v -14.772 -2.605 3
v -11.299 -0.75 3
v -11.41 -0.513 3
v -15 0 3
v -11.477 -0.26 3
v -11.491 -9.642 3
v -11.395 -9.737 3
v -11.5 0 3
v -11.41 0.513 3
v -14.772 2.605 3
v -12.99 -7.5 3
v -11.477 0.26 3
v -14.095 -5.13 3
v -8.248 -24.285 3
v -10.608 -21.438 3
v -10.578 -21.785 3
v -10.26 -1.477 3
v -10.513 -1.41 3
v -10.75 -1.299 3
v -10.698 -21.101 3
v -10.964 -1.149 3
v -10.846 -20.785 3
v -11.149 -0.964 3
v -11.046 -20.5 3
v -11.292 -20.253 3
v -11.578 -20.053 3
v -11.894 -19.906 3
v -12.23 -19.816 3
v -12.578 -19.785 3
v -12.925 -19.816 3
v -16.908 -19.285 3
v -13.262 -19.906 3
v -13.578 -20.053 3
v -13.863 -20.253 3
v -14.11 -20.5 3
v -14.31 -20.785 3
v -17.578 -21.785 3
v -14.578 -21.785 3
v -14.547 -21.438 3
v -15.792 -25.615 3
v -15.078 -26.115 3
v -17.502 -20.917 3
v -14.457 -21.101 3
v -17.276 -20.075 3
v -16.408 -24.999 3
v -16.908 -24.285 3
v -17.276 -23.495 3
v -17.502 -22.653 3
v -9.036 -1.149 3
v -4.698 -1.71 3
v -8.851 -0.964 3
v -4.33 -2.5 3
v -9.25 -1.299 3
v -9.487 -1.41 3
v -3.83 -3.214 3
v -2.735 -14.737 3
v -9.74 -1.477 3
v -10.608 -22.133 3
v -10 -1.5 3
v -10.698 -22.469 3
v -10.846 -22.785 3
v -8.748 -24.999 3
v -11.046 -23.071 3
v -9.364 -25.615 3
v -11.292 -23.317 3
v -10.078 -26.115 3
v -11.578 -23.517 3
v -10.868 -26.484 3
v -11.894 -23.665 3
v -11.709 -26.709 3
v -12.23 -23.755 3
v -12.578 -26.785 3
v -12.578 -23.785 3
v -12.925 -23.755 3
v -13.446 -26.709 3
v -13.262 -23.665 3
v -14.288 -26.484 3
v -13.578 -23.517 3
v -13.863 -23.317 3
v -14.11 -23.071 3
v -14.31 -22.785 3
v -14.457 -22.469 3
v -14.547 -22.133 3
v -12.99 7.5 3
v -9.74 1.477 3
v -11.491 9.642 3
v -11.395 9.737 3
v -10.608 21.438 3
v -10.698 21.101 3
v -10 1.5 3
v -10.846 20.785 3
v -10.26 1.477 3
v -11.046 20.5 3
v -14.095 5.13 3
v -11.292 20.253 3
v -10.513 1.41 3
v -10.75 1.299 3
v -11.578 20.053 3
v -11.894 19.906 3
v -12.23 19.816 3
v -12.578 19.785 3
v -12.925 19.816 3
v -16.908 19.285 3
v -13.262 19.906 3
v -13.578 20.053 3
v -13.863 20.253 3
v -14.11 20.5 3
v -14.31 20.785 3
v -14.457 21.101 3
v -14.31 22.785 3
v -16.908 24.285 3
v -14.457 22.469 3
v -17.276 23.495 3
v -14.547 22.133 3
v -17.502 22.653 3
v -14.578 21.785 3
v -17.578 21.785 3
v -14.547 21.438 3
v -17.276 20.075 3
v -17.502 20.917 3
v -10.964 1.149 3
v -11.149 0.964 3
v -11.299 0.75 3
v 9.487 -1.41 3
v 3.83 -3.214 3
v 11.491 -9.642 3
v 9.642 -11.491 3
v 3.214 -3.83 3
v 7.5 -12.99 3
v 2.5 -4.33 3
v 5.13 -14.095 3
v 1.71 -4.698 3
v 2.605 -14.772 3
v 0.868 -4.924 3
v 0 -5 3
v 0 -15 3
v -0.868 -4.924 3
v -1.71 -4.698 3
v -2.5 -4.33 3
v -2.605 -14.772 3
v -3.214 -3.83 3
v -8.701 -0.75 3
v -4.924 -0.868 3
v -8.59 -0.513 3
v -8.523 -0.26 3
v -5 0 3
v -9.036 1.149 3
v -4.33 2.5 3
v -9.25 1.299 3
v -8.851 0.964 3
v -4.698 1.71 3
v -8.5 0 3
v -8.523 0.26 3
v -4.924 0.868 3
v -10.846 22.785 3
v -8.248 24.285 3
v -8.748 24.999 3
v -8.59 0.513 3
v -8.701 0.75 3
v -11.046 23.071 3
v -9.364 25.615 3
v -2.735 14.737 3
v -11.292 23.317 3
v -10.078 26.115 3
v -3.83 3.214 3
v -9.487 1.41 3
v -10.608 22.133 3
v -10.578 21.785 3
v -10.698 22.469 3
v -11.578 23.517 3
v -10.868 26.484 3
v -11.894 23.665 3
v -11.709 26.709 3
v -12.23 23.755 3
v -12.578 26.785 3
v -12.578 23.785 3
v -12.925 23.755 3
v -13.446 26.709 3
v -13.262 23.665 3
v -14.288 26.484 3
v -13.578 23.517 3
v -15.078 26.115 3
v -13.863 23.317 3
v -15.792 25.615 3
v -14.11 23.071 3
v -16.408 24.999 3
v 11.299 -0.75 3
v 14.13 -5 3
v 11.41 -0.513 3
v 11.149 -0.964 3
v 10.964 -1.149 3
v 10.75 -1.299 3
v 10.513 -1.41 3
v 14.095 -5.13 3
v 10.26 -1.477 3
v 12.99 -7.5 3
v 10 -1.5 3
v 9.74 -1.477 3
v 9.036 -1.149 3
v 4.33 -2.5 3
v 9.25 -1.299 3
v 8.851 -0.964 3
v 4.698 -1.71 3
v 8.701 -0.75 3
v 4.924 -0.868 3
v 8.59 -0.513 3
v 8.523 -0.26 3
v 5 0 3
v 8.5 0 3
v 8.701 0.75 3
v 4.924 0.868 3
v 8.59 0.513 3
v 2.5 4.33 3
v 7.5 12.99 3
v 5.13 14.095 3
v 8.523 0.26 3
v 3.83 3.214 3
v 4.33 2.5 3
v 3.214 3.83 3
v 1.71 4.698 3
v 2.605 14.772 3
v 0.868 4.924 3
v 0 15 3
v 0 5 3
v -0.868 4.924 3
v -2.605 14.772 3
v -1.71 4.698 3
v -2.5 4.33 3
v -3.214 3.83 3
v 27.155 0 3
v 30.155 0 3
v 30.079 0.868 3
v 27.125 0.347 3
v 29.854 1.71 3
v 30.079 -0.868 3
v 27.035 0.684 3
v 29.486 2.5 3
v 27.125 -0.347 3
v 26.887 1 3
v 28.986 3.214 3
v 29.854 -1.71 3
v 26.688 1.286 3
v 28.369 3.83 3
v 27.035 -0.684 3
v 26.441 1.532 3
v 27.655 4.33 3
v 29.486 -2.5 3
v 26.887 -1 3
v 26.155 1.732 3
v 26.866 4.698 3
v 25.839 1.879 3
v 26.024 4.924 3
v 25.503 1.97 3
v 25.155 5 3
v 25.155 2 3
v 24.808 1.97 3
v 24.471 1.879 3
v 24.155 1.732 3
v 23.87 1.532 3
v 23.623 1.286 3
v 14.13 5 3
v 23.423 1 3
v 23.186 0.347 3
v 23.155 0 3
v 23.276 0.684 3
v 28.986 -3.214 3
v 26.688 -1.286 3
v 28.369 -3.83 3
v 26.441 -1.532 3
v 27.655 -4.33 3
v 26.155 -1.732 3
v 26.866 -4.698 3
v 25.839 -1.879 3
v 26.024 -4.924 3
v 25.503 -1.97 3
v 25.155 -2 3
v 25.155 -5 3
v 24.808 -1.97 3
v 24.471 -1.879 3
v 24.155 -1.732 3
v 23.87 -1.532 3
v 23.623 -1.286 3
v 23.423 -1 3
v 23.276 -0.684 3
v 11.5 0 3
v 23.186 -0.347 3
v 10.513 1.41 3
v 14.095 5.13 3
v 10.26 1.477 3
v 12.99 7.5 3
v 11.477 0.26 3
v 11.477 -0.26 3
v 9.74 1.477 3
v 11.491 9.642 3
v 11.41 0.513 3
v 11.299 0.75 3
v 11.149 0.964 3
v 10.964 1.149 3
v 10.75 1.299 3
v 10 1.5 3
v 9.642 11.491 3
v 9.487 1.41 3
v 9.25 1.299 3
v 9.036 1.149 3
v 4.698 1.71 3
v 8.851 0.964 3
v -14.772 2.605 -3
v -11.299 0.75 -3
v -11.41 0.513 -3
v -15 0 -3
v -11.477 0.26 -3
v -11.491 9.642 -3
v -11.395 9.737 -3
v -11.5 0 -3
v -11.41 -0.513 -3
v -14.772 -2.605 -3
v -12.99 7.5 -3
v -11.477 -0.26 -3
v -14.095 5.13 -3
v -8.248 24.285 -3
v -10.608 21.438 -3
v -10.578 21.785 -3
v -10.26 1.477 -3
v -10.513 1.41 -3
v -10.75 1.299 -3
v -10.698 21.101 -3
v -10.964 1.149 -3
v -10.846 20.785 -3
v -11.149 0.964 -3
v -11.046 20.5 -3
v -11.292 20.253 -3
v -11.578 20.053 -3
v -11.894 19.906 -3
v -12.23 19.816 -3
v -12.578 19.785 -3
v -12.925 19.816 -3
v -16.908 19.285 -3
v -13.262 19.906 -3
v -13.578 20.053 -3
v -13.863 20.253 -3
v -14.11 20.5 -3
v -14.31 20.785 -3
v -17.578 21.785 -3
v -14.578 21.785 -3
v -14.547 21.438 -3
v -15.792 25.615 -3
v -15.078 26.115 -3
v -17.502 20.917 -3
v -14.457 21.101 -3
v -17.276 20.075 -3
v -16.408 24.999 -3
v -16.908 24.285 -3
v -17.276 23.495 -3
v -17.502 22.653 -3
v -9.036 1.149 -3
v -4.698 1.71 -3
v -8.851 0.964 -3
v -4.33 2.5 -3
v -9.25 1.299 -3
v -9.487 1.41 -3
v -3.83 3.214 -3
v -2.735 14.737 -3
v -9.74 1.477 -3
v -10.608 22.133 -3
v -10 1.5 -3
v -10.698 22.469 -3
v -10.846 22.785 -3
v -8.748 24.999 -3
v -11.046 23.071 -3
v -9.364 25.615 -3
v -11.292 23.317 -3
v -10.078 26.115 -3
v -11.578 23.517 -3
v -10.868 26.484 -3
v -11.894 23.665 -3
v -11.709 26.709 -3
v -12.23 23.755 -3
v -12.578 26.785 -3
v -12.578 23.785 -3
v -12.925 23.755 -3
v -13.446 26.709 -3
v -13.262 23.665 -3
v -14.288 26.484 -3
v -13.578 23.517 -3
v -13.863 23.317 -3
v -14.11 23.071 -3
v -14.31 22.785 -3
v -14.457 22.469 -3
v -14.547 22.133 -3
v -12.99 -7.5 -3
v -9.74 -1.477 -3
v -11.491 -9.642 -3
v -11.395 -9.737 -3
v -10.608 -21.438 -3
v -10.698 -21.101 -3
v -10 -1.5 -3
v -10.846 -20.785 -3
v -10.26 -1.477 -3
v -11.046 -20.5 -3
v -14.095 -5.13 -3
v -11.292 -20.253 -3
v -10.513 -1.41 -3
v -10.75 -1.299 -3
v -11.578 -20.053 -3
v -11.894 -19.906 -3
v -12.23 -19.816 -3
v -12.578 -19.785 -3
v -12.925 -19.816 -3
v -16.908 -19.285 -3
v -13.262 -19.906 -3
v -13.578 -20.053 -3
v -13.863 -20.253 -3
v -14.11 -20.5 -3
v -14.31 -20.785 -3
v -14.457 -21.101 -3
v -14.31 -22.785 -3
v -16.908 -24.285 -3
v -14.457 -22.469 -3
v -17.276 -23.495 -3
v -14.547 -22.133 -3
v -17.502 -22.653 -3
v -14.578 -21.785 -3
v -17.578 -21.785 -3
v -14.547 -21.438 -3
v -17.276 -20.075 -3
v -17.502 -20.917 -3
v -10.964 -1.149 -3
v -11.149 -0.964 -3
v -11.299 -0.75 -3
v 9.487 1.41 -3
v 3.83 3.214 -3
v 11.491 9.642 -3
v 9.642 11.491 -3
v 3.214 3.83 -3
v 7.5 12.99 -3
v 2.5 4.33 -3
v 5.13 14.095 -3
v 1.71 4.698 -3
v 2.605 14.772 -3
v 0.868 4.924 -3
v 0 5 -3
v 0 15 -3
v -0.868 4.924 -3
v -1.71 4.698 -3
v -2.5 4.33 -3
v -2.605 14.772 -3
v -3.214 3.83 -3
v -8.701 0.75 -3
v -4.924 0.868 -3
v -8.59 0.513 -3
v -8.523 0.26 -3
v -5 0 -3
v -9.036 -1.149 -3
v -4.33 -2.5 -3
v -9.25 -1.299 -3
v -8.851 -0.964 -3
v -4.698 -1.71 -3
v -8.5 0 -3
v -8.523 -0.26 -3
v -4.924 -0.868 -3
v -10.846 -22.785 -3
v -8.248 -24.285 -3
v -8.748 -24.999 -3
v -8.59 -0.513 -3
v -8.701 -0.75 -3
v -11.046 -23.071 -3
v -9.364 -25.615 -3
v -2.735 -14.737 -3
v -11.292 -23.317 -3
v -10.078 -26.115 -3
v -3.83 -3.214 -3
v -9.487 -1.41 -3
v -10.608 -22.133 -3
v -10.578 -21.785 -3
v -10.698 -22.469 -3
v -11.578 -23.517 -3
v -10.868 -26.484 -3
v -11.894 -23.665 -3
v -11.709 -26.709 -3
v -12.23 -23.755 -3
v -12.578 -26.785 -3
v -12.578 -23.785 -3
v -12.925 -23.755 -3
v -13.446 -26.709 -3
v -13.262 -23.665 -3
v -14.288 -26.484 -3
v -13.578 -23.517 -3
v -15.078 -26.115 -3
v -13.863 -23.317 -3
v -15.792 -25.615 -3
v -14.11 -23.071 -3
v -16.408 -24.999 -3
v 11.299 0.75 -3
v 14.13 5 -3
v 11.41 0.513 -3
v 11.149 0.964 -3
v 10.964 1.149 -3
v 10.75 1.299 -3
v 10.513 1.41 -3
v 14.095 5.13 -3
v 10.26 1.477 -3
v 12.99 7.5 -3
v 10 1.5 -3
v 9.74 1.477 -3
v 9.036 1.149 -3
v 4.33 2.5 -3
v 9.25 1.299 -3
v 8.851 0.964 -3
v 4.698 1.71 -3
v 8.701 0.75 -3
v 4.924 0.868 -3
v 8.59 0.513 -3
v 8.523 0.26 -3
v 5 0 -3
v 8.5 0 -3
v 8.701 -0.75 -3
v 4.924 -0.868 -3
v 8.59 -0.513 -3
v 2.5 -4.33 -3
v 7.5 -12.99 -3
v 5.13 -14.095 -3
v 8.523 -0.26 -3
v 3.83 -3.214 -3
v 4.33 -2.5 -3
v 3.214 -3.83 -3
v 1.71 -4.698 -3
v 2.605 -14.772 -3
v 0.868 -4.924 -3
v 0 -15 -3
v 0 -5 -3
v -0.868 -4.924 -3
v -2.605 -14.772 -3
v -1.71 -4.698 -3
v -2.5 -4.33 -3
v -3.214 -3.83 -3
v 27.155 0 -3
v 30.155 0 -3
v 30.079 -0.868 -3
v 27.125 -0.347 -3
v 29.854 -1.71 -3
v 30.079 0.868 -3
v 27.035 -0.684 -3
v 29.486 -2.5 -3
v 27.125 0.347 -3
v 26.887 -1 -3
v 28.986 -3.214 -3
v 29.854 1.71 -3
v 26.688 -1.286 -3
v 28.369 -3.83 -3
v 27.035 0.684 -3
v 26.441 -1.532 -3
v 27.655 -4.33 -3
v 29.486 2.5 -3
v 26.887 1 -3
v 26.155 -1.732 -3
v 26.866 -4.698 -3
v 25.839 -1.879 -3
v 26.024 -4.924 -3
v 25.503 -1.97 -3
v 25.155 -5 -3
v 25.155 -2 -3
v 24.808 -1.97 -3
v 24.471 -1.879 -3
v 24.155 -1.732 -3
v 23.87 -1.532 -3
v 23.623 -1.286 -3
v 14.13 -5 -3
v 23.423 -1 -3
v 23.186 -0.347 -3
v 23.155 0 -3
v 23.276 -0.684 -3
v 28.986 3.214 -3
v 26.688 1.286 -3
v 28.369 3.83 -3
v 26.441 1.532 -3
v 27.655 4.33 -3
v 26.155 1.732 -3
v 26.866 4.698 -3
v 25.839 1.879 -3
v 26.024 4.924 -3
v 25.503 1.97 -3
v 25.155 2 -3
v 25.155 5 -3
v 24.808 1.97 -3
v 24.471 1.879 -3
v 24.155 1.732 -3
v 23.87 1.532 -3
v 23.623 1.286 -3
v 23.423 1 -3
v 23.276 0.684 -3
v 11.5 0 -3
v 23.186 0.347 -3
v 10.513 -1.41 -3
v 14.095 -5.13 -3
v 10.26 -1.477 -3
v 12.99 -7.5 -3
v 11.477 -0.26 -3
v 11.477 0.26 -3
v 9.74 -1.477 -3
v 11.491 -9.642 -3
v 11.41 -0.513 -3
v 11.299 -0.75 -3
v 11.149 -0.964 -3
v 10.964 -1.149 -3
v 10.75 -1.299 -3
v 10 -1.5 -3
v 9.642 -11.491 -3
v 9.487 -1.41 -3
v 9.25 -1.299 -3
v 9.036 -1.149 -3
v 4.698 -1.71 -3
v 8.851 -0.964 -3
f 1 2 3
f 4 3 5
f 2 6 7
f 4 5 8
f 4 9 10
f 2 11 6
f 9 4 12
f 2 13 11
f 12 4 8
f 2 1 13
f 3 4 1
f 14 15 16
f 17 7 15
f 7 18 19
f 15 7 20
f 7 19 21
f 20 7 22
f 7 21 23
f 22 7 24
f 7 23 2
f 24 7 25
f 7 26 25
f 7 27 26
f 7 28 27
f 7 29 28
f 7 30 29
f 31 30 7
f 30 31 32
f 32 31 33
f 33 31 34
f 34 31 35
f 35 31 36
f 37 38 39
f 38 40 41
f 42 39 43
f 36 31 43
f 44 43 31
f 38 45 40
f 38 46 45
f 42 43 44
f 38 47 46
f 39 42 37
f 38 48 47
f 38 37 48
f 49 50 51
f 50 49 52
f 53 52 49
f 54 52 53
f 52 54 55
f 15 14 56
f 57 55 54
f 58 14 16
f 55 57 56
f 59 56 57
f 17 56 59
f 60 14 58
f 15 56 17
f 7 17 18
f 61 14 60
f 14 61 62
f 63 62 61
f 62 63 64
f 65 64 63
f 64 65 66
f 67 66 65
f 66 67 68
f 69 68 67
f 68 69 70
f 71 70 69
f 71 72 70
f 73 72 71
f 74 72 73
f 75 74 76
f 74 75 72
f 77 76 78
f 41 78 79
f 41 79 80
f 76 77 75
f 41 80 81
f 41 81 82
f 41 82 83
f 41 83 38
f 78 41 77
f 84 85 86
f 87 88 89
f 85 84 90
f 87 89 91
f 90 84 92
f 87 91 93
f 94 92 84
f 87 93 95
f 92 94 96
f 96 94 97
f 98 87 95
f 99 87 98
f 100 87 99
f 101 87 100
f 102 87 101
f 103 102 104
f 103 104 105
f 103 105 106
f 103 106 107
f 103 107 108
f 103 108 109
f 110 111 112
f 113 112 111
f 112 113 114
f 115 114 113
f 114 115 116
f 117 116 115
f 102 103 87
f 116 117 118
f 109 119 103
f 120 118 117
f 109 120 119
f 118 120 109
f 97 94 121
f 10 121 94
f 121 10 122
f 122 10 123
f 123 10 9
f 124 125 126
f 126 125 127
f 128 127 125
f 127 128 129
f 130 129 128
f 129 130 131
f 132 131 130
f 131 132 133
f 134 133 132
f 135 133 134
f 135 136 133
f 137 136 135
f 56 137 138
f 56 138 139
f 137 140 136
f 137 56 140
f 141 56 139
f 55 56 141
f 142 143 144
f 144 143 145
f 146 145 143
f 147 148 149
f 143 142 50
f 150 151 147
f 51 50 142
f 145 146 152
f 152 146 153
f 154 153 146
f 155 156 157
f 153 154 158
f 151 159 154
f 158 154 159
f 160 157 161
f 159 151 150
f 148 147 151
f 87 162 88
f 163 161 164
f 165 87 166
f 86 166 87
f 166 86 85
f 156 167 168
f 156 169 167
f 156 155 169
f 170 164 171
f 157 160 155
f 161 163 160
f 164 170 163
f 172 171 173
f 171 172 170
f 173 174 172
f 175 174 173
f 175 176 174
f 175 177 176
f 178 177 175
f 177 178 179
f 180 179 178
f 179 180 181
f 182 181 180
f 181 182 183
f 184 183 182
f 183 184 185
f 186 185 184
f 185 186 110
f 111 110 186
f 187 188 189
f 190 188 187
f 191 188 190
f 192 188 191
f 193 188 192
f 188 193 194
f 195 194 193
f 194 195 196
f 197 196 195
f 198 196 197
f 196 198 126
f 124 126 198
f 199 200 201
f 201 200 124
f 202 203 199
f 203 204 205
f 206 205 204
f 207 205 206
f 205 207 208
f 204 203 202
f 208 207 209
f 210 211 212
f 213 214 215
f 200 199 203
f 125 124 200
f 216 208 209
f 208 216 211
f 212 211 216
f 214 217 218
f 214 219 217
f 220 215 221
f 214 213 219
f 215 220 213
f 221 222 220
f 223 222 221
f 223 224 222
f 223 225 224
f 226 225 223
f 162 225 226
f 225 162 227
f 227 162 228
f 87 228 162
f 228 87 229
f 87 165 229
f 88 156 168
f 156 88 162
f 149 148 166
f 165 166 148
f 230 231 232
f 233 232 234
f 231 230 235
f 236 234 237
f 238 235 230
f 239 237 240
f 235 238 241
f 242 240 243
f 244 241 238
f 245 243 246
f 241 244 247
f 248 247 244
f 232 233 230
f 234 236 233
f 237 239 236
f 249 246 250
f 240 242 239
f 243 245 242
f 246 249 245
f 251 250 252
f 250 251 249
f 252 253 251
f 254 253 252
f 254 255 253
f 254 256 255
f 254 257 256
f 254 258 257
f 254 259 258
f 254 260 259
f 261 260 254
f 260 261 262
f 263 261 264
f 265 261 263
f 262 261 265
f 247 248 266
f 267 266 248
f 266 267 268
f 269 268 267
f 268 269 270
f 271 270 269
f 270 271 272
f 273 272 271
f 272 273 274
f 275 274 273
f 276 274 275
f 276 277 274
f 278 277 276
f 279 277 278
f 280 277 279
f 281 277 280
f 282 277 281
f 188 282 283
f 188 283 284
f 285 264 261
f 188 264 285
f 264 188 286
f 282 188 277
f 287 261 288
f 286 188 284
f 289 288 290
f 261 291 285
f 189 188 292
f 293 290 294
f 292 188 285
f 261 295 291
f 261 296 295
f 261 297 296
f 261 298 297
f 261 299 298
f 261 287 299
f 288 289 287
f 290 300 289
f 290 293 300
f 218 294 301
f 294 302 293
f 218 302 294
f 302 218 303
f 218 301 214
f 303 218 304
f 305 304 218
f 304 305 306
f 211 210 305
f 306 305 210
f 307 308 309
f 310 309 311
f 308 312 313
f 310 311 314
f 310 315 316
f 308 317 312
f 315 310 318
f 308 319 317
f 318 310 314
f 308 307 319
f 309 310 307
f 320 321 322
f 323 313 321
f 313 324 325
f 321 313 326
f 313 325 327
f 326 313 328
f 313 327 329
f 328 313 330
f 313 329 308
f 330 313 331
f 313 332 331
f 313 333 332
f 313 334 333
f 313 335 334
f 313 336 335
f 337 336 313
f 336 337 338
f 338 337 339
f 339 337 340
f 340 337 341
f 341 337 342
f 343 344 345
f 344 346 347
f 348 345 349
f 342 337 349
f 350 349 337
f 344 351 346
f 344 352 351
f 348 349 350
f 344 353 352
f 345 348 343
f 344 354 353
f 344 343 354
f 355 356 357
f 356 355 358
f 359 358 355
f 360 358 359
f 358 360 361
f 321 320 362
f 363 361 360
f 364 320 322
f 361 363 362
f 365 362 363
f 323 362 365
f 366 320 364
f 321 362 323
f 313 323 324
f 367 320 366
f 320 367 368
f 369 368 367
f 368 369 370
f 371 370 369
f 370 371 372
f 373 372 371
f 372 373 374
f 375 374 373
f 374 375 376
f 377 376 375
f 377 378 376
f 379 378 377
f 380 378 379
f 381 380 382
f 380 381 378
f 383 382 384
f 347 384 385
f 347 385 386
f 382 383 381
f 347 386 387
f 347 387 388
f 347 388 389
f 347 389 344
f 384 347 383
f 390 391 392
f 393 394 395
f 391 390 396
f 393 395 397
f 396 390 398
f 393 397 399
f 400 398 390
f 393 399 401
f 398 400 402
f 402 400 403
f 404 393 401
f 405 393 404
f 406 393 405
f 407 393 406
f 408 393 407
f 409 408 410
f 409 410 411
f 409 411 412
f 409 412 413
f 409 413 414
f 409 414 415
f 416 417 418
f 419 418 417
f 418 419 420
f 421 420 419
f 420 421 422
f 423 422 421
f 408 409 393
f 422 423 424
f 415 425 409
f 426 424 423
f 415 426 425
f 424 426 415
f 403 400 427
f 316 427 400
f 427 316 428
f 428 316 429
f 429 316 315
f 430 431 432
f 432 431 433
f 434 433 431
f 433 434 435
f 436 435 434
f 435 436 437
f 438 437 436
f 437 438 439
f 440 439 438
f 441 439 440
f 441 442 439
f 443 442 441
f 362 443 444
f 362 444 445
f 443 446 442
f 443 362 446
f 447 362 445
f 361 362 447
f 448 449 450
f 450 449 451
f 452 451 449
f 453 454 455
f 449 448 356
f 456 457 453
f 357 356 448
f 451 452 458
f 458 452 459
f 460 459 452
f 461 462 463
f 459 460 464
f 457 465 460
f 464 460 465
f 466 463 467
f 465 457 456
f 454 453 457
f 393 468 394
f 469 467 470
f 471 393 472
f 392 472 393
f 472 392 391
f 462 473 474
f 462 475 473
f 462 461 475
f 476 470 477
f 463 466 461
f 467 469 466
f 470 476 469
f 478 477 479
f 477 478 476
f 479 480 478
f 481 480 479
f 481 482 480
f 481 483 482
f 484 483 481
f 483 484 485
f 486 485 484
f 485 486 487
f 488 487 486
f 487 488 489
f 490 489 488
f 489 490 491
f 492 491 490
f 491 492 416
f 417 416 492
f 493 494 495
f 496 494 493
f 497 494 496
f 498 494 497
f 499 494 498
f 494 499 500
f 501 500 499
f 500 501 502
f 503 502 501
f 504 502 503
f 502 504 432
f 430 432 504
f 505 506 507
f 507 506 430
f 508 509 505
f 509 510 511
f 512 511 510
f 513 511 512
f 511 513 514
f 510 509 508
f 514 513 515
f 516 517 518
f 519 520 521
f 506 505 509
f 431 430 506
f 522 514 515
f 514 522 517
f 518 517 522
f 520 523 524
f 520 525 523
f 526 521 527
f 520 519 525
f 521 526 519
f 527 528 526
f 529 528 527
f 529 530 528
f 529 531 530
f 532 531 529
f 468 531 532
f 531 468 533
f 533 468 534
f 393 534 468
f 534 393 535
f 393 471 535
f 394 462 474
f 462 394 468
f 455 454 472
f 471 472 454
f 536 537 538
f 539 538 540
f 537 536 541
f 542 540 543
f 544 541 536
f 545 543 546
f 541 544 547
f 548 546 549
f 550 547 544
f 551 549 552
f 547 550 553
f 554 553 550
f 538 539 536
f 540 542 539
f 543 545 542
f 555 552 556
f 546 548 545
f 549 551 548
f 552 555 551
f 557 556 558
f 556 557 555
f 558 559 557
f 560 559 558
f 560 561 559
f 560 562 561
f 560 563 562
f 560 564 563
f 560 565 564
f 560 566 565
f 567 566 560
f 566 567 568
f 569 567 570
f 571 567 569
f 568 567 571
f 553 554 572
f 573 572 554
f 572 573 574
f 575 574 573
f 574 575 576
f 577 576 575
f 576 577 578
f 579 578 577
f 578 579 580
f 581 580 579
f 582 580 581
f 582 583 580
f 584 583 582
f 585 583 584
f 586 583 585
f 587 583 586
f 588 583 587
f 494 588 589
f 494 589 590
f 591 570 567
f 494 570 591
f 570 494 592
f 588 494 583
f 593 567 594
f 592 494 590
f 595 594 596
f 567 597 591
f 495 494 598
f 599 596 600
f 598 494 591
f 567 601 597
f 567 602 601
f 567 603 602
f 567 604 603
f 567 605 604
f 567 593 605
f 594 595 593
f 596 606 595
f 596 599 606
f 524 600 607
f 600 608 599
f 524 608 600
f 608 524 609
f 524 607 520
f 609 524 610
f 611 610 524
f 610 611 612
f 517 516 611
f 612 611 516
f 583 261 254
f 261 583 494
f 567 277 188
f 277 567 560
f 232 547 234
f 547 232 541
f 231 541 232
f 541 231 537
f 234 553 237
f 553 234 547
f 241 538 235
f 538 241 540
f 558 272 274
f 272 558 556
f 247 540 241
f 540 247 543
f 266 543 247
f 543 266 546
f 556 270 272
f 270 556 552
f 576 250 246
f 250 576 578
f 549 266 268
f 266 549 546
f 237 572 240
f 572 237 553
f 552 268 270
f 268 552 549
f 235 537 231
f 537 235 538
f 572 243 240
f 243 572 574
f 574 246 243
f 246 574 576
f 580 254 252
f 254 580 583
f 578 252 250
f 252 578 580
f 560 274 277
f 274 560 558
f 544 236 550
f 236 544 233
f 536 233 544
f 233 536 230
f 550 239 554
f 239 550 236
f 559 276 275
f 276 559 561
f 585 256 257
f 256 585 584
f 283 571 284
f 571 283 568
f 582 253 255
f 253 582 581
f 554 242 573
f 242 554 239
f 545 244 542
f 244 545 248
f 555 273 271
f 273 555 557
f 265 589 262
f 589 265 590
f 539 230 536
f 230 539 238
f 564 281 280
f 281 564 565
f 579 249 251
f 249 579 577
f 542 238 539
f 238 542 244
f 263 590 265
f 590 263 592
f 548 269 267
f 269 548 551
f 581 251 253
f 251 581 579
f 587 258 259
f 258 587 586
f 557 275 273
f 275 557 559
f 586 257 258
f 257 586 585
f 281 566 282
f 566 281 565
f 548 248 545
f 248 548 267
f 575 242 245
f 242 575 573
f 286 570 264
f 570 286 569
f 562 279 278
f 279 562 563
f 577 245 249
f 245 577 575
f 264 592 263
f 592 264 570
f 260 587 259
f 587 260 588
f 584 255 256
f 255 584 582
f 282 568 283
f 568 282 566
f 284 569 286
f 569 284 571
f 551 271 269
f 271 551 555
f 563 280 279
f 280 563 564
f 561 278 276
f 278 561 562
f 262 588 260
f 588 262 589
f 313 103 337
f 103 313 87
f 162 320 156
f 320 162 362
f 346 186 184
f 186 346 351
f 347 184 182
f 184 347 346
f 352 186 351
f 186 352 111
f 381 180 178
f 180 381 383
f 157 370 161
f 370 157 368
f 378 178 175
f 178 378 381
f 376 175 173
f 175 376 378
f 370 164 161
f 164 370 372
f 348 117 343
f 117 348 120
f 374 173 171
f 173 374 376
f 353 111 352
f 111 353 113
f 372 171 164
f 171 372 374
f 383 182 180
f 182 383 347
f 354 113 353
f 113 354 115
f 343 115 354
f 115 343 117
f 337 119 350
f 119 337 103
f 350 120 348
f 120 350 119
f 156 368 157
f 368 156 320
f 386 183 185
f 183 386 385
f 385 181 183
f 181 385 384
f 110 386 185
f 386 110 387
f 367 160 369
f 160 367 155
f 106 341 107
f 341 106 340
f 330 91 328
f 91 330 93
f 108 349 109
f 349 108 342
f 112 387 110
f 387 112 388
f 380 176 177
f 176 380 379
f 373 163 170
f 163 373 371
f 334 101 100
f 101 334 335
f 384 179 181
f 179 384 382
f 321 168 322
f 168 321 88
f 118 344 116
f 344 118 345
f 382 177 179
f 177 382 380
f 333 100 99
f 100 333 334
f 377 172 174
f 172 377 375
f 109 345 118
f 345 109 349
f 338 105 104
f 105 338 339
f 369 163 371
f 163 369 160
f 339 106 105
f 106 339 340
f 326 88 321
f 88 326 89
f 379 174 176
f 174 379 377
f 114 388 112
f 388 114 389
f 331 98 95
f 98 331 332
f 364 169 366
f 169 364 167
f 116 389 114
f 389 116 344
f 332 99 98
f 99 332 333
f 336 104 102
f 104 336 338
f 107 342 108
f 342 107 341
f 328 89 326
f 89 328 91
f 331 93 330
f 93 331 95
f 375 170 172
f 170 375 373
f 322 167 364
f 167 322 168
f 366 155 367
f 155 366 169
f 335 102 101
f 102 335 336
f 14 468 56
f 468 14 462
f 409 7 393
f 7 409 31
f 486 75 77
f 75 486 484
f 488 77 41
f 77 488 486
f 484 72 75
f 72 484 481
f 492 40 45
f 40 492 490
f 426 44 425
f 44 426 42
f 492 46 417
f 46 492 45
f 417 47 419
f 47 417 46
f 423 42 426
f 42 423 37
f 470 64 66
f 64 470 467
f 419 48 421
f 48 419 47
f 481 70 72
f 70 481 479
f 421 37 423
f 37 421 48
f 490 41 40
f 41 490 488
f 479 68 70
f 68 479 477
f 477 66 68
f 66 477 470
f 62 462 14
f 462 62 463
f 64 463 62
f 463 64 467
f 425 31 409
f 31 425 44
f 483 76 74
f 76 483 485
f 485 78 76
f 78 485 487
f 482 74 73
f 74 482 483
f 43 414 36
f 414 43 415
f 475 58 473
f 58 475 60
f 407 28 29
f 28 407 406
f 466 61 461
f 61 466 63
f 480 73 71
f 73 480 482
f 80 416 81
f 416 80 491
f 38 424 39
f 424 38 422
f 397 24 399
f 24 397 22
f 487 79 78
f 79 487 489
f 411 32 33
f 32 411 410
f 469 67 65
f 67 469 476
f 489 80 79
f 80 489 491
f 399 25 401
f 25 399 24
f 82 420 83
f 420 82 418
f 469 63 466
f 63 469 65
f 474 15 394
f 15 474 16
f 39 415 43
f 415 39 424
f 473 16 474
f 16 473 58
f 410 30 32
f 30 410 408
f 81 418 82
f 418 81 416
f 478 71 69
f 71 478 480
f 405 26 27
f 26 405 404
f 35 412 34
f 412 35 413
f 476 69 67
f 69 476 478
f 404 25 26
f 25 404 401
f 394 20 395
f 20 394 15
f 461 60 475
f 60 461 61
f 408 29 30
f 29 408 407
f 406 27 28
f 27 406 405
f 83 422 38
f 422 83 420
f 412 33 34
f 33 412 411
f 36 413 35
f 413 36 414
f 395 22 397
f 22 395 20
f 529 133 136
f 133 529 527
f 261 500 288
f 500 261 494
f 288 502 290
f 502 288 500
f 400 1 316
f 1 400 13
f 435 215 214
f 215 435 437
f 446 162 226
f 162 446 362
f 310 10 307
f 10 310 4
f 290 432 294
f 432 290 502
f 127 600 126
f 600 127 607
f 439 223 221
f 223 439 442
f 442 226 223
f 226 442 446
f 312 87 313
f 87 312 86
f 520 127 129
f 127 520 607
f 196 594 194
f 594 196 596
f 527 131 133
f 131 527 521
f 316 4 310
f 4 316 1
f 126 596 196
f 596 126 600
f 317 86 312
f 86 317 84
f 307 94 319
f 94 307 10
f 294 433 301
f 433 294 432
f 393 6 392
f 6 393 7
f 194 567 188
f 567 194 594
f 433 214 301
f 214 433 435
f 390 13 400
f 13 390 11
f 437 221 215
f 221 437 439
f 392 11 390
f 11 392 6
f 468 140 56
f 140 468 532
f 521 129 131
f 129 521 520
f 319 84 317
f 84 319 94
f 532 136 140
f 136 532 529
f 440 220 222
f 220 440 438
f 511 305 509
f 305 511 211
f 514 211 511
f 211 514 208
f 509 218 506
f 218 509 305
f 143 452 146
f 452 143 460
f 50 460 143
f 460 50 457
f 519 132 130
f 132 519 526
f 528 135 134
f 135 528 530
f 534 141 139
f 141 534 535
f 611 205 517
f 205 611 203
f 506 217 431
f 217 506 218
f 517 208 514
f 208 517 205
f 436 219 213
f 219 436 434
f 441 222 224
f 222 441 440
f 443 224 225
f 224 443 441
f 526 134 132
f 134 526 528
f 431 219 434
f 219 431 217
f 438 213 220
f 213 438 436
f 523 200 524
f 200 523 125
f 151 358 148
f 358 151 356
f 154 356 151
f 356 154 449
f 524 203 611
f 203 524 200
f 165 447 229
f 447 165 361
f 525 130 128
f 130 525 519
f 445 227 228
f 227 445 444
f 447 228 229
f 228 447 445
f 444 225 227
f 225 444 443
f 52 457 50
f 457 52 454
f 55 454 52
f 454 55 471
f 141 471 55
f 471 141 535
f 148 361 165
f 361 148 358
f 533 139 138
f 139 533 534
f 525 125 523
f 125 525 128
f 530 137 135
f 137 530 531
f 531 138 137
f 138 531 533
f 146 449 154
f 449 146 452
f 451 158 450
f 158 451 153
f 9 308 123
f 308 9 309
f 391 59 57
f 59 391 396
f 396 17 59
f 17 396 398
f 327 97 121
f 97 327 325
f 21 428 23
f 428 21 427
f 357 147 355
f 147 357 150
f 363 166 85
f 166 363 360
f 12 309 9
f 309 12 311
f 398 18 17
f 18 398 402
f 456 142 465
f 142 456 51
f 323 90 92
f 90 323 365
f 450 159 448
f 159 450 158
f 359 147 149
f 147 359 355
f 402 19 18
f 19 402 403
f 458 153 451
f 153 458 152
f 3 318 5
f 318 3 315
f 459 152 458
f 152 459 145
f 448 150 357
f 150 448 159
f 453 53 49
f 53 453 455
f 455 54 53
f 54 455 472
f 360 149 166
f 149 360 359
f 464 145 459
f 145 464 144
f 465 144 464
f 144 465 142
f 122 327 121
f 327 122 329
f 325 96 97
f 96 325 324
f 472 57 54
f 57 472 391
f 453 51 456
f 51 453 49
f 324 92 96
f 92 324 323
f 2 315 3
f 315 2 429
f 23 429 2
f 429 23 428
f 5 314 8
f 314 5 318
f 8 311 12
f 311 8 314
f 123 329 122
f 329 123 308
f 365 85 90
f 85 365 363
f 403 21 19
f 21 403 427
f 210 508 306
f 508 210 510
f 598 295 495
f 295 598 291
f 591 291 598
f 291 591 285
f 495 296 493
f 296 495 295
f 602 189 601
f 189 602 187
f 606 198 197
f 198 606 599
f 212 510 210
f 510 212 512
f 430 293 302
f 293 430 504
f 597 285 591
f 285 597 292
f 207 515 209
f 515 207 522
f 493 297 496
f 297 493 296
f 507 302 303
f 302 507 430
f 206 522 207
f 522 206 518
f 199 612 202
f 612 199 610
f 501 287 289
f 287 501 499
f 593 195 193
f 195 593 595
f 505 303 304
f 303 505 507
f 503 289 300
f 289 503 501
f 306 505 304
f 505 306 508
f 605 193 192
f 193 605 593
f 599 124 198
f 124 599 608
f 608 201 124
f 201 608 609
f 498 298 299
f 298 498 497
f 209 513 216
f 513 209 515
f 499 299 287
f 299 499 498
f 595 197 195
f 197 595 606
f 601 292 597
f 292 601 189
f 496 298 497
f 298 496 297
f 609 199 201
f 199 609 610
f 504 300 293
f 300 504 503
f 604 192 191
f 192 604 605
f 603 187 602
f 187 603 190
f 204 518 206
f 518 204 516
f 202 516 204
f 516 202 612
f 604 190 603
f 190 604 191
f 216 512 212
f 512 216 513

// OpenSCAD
// file: config.scad
$fn=36;



// ширина промежутка между наружными краями конусов
delta_width=45;

// диаметр отверстия
bolt_d = 3;
bolt_r = bolt_d/2;

// цилиндр крепления тяг
cyl_w = 5;
cyl_d = 10;
cyl_r = cyl_d/2;

// конус крепления тяг
con_w = 5;
con_r = bolt_r+1;
con_d = con_r*2;



// толщина всего элемента эффектора
H_effector = 6;

// диаметр круглого большого отверстия в центре
D_effector_hole = 40;

// длина стороны эффектора
L_effector = delta_width-2*con_w;

// диаметр отверстия для крепления, которых 12 штук вокруг большого отверстия
d_effector = 4;

// радиус размещения отверстий для крепления
effector_drill_r_base = (D_effector_hole/2 + sqrt(L_effector*L_effector*3/4))/2;


finger_D = 10;
finger_H = 6;
// main file
include <config.scad>;

module mount() {
	difference() {
		union() {
			translate([effector_drill_r_base/2, 0, 0])
			cube(center=true, size=[effector_drill_r_base, finger_D, finger_H]);

			translate([effector_drill_r_base, 0, 0])
			cylinder(center=true, r=finger_D/2, h=finger_H);
		}
		translate([effector_drill_r_base, 0, 0])
		cylinder(center=true, r=d_effector/2, h=finger_H*2);
	}
}


difference() {
	union() {
		mount();

		rotate(a=120, v=[0,0,1])
		mount();

		rotate(a=240, v=[0,0,1])
		mount();

		cylinder(center=true, r=finger_D*1.5, h=finger_H);
	}
	union() {
		cylinder(center=true, r=finger_D/2, h=finger_H*2);

		translate([-finger_D, 0, 0])
		cylinder(center=true, r=bolt_r, h=finger_H*2);

		translate([finger_D, 0, 0])
		cylinder(center=true, r=bolt_r, h=finger_H*2);
	}
}
